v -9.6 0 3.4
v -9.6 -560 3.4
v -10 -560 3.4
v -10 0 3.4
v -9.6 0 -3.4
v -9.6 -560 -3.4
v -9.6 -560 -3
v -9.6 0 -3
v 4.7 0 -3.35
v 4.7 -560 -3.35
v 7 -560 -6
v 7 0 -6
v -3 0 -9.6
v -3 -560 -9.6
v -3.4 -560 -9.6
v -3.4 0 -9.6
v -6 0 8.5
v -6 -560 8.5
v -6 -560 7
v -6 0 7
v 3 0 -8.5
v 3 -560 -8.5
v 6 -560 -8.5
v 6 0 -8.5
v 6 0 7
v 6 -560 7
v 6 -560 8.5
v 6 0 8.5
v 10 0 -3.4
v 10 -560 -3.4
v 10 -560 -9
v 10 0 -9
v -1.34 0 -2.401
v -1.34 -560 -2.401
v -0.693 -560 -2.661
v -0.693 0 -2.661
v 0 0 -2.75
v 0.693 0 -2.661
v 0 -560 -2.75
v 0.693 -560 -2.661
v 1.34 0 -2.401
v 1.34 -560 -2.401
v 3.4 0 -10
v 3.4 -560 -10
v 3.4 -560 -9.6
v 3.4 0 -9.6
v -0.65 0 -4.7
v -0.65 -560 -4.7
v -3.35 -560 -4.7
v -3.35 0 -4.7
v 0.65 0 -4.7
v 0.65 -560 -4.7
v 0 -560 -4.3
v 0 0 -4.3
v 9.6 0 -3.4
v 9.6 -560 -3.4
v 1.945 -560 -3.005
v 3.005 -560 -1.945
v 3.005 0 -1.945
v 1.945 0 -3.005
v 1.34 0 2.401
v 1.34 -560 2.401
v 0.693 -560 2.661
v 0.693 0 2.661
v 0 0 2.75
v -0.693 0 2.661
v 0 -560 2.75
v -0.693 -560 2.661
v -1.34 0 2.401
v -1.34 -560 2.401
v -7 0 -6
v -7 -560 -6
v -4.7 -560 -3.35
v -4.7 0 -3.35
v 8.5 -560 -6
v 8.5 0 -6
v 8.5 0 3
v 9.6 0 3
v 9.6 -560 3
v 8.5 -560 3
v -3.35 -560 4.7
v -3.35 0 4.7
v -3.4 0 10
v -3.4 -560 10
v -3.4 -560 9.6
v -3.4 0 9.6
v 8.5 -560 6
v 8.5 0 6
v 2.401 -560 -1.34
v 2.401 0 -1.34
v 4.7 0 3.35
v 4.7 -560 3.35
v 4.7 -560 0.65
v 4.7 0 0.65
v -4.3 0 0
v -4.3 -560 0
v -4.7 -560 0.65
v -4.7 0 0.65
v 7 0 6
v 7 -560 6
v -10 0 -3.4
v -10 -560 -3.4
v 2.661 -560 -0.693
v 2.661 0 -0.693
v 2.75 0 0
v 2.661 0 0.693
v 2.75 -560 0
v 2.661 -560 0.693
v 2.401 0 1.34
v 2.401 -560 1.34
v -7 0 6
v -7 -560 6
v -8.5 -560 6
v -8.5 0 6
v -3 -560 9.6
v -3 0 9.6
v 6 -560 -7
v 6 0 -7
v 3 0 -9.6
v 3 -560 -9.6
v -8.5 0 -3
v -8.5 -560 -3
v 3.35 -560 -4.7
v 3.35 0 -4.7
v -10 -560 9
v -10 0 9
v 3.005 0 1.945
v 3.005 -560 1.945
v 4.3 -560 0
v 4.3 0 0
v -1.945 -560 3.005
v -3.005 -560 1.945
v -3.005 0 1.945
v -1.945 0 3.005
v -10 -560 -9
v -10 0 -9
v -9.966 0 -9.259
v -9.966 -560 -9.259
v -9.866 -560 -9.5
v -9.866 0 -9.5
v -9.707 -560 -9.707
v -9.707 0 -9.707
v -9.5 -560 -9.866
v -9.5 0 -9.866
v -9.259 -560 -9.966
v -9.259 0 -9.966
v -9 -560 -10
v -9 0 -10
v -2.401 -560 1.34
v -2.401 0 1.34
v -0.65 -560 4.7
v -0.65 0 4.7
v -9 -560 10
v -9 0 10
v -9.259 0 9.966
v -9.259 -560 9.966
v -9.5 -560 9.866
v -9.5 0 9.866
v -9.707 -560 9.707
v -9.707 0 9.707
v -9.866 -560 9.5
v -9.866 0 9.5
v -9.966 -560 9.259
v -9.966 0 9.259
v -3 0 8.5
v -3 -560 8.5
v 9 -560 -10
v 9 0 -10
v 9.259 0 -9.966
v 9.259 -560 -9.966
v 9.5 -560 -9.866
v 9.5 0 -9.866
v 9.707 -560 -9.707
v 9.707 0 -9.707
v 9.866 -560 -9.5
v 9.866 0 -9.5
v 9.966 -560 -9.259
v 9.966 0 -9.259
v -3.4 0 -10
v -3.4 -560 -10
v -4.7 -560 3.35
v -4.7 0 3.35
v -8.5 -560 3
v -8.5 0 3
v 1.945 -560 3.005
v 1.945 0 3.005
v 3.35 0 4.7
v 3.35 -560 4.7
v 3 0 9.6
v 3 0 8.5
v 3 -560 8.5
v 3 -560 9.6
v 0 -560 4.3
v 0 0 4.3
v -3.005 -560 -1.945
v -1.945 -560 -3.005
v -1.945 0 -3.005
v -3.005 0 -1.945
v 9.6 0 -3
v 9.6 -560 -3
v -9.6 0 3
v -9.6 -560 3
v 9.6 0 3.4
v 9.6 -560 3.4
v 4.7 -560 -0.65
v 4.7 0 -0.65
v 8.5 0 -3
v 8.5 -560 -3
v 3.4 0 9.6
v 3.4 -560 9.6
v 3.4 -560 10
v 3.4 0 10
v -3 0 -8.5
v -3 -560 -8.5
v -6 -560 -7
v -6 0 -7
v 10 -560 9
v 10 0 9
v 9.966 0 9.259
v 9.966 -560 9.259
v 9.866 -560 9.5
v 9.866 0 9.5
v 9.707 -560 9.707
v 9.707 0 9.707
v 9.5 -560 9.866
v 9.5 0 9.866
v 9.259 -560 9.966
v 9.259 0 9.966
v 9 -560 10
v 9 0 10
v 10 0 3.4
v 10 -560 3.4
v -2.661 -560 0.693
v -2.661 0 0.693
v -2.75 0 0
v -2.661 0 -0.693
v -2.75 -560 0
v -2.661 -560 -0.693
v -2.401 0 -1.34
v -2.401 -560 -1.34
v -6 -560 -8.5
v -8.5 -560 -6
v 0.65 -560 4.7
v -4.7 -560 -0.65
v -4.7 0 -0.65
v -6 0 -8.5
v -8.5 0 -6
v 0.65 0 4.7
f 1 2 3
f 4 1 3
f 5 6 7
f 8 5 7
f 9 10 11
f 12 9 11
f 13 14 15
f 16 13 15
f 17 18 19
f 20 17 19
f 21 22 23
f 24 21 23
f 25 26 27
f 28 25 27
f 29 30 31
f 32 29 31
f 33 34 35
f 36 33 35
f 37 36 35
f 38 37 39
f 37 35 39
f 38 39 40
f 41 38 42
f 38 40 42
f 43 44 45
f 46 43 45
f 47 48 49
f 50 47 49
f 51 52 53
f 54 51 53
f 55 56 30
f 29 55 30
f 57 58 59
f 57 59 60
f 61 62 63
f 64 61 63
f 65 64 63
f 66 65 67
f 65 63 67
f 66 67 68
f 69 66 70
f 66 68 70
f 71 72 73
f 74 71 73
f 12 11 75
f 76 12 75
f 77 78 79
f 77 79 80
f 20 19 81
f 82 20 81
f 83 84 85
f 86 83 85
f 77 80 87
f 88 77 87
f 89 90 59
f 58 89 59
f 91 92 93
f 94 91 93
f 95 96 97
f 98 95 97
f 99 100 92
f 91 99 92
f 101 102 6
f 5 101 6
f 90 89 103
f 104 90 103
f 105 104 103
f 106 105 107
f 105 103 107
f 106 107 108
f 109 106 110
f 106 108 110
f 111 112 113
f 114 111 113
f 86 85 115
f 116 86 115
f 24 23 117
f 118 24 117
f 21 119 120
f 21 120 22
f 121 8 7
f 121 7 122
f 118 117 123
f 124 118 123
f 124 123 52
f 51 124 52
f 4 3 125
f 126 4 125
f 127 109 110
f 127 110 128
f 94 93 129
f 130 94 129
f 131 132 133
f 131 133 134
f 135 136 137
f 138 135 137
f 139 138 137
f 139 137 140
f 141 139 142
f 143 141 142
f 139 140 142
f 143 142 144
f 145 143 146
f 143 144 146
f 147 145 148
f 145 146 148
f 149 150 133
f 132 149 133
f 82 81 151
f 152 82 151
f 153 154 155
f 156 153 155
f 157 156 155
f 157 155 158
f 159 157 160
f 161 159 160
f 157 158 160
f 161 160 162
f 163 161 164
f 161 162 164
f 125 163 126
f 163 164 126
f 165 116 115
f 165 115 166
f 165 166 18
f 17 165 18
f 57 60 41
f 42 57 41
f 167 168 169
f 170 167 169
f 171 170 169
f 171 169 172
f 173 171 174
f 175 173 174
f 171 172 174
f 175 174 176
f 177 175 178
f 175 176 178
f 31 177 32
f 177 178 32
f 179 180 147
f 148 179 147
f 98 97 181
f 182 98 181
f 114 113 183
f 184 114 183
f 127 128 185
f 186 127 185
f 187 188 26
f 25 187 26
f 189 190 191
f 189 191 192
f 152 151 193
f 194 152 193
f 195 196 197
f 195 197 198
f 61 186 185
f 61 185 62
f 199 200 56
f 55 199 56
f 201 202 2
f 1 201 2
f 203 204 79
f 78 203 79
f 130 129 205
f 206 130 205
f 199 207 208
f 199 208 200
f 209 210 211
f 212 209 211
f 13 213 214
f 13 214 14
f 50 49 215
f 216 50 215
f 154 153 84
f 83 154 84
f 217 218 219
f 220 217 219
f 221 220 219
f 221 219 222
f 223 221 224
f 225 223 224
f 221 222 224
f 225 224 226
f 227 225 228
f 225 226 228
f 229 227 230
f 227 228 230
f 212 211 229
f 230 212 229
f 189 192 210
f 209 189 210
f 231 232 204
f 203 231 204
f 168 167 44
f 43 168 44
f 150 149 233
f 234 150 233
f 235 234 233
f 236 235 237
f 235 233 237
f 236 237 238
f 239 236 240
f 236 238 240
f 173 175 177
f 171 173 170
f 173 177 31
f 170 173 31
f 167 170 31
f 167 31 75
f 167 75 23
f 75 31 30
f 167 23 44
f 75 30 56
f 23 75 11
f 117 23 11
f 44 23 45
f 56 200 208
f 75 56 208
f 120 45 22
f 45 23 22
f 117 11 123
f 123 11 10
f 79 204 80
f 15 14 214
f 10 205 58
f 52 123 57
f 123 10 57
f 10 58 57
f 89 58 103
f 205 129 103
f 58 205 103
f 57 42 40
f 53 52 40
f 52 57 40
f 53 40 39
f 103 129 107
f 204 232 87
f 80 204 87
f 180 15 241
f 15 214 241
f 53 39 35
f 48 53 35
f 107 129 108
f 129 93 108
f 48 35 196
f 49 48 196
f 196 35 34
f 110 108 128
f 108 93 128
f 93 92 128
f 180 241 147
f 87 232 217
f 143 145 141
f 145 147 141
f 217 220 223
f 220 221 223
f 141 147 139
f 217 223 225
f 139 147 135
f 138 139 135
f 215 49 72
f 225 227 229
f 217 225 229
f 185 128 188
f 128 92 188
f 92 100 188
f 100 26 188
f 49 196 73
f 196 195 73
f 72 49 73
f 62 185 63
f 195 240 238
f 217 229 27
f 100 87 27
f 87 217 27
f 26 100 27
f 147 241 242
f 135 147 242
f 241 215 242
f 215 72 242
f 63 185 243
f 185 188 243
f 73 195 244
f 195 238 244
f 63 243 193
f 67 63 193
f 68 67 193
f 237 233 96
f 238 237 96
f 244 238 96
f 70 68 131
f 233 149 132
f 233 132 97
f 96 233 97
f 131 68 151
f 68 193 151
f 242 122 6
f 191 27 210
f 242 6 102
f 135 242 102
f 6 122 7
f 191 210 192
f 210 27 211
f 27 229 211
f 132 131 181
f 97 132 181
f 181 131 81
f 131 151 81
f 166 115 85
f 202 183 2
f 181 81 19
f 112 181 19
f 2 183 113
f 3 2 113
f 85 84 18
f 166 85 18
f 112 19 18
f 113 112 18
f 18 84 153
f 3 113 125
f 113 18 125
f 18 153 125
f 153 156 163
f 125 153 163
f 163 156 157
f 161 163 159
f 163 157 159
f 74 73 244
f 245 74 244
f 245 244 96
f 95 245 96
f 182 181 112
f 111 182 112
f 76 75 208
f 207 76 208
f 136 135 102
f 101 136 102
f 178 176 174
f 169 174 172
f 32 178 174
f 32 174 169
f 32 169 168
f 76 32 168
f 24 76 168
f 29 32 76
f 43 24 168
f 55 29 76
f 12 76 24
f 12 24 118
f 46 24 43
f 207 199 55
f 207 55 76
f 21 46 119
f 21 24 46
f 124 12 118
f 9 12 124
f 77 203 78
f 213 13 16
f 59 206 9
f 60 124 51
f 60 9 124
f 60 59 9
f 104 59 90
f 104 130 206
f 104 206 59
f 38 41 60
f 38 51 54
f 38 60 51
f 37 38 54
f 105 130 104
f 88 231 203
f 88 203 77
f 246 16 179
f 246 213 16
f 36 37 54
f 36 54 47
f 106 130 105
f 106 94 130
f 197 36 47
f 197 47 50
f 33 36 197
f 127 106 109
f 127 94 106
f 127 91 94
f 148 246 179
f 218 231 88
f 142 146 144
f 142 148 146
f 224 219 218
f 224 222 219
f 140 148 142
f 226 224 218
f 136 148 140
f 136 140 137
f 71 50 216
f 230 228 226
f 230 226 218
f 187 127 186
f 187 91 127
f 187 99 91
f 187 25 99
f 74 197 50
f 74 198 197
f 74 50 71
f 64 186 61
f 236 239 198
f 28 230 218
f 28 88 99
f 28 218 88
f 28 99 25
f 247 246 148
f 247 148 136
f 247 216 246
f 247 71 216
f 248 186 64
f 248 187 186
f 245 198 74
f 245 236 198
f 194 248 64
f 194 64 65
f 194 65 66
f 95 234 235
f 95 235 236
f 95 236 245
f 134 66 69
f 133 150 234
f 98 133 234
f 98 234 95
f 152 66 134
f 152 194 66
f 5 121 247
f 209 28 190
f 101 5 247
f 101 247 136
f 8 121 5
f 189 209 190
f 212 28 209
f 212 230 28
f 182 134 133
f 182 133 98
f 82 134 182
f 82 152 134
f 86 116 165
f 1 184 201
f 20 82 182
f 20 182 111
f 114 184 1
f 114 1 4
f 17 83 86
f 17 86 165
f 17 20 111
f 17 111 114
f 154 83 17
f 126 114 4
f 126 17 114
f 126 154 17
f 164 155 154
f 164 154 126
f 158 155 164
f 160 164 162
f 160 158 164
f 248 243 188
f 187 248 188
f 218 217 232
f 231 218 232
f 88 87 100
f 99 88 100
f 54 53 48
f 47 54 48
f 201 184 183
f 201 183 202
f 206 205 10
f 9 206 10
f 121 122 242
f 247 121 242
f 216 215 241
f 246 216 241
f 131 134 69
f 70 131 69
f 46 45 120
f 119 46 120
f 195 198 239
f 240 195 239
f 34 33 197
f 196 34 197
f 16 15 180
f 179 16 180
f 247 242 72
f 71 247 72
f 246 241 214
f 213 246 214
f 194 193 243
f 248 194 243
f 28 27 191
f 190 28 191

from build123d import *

# Parameters (mm, degrees)
PAD_DEPTH          = 560
POCKET_DEPTH       = 560
POLARPATTERN_COUNT = 4
POCKET001_DEPTH    = 560


with BuildPart() as part:
    # Sketch → Pad (new body)
    with BuildSketch(Plane.XZ):
        with BuildLine():
            Line((-9, 10), (9, 10))
            ThreePointArc((10, 9), (9.707107, 9.707107), (9, 10))
            Line((10, 9), (10, -9))
            ThreePointArc((9, -10), (9.707107, -9.707107), (10, -9))
            Line((9, -10), (-9, -10))
            ThreePointArc((-10, -9), (-9.707107, -9.707107), (-9, -10))
            Line((-10, -9), (-10, 9))
            ThreePointArc((-9, 10), (-9.707107, 9.707107), (-10, 9))
        make_face()
    extrude(amount=PAD_DEPTH)

    # Sketch001 (on Face10 of Pad) → Pocket (cut)
    with BuildSketch(Plane.XZ.offset(560)):
        Polygon((-3.4, 10), (-3.4, 9.6), (-3, 9.6), (-3, 8.5), (-6, 8.5), (-6, 7), (-3.35, 4.7), (-0.65, 4.7), (0, 4.3), (0.65, 4.7), (3.35, 4.7), (6, 7), (6, 8.5), (3, 8.5), (3, 9.6), (3.4, 9.6), (3.4, 10), align=None)
    pocket = extrude(amount=-POCKET_DEPTH, mode=Mode.SUBTRACT)

    # PolarPattern: Pocket ×4 about axis
    polarpattern_axis = Axis((0, -560, 0), (0, -1, 0))
    for i in range(1, POLARPATTERN_COUNT):
        add(pocket.rotate(polarpattern_axis, i * 360 / POLARPATTERN_COUNT), mode=Mode.SUBTRACT)

    # Sketch002 (on Face4 of PolarPattern) → Pocket001 (cut)
    with BuildSketch(Plane.XZ.offset(560)):
        with BuildLine():
            ThreePointArc((1.340499, 2.401159), (0, 2.75), (-1.340499, 2.401159))
            Line((-1.944544, 3.005204), (-1.340499, 2.401159))
            Line((-3.005204, 1.944544), (-1.944544, 3.005204))
            Line((-2.401159, 1.340499), (-3.005204, 1.944544))
            ThreePointArc((-2.401159, 1.340499), (-2.75, 0), (-2.401159, -1.340499))
            Line((-3.005204, -1.944544), (-2.401159, -1.340499))
            Line((-1.944544, -3.005204), (-3.005204, -1.944544))
            Line((-1.340499, -2.401159), (-1.944544, -3.005204))
            ThreePointArc((-1.340499, -2.401159), (0, -2.75), (1.340499, -2.401159))
            Line((1.944544, -3.005204), (1.340499, -2.401159))
            Line((3.005204, -1.944544), (1.944544, -3.005204))
            Line((2.401159, -1.340499), (3.005204, -1.944544))
            ThreePointArc((2.401159, -1.340499), (2.75, 0), (2.401159, 1.340499))
            Line((2.401159, 1.340499), (3.005204, 1.944544))
            Line((3.005204, 1.944544), (1.944544, 3.005204))
            Line((1.944544, 3.005204), (1.340499, 2.401159))
        make_face()
    extrude(amount=-POCKET001_DEPTH, mode=Mode.SUBTRACT)


solid = part.part
